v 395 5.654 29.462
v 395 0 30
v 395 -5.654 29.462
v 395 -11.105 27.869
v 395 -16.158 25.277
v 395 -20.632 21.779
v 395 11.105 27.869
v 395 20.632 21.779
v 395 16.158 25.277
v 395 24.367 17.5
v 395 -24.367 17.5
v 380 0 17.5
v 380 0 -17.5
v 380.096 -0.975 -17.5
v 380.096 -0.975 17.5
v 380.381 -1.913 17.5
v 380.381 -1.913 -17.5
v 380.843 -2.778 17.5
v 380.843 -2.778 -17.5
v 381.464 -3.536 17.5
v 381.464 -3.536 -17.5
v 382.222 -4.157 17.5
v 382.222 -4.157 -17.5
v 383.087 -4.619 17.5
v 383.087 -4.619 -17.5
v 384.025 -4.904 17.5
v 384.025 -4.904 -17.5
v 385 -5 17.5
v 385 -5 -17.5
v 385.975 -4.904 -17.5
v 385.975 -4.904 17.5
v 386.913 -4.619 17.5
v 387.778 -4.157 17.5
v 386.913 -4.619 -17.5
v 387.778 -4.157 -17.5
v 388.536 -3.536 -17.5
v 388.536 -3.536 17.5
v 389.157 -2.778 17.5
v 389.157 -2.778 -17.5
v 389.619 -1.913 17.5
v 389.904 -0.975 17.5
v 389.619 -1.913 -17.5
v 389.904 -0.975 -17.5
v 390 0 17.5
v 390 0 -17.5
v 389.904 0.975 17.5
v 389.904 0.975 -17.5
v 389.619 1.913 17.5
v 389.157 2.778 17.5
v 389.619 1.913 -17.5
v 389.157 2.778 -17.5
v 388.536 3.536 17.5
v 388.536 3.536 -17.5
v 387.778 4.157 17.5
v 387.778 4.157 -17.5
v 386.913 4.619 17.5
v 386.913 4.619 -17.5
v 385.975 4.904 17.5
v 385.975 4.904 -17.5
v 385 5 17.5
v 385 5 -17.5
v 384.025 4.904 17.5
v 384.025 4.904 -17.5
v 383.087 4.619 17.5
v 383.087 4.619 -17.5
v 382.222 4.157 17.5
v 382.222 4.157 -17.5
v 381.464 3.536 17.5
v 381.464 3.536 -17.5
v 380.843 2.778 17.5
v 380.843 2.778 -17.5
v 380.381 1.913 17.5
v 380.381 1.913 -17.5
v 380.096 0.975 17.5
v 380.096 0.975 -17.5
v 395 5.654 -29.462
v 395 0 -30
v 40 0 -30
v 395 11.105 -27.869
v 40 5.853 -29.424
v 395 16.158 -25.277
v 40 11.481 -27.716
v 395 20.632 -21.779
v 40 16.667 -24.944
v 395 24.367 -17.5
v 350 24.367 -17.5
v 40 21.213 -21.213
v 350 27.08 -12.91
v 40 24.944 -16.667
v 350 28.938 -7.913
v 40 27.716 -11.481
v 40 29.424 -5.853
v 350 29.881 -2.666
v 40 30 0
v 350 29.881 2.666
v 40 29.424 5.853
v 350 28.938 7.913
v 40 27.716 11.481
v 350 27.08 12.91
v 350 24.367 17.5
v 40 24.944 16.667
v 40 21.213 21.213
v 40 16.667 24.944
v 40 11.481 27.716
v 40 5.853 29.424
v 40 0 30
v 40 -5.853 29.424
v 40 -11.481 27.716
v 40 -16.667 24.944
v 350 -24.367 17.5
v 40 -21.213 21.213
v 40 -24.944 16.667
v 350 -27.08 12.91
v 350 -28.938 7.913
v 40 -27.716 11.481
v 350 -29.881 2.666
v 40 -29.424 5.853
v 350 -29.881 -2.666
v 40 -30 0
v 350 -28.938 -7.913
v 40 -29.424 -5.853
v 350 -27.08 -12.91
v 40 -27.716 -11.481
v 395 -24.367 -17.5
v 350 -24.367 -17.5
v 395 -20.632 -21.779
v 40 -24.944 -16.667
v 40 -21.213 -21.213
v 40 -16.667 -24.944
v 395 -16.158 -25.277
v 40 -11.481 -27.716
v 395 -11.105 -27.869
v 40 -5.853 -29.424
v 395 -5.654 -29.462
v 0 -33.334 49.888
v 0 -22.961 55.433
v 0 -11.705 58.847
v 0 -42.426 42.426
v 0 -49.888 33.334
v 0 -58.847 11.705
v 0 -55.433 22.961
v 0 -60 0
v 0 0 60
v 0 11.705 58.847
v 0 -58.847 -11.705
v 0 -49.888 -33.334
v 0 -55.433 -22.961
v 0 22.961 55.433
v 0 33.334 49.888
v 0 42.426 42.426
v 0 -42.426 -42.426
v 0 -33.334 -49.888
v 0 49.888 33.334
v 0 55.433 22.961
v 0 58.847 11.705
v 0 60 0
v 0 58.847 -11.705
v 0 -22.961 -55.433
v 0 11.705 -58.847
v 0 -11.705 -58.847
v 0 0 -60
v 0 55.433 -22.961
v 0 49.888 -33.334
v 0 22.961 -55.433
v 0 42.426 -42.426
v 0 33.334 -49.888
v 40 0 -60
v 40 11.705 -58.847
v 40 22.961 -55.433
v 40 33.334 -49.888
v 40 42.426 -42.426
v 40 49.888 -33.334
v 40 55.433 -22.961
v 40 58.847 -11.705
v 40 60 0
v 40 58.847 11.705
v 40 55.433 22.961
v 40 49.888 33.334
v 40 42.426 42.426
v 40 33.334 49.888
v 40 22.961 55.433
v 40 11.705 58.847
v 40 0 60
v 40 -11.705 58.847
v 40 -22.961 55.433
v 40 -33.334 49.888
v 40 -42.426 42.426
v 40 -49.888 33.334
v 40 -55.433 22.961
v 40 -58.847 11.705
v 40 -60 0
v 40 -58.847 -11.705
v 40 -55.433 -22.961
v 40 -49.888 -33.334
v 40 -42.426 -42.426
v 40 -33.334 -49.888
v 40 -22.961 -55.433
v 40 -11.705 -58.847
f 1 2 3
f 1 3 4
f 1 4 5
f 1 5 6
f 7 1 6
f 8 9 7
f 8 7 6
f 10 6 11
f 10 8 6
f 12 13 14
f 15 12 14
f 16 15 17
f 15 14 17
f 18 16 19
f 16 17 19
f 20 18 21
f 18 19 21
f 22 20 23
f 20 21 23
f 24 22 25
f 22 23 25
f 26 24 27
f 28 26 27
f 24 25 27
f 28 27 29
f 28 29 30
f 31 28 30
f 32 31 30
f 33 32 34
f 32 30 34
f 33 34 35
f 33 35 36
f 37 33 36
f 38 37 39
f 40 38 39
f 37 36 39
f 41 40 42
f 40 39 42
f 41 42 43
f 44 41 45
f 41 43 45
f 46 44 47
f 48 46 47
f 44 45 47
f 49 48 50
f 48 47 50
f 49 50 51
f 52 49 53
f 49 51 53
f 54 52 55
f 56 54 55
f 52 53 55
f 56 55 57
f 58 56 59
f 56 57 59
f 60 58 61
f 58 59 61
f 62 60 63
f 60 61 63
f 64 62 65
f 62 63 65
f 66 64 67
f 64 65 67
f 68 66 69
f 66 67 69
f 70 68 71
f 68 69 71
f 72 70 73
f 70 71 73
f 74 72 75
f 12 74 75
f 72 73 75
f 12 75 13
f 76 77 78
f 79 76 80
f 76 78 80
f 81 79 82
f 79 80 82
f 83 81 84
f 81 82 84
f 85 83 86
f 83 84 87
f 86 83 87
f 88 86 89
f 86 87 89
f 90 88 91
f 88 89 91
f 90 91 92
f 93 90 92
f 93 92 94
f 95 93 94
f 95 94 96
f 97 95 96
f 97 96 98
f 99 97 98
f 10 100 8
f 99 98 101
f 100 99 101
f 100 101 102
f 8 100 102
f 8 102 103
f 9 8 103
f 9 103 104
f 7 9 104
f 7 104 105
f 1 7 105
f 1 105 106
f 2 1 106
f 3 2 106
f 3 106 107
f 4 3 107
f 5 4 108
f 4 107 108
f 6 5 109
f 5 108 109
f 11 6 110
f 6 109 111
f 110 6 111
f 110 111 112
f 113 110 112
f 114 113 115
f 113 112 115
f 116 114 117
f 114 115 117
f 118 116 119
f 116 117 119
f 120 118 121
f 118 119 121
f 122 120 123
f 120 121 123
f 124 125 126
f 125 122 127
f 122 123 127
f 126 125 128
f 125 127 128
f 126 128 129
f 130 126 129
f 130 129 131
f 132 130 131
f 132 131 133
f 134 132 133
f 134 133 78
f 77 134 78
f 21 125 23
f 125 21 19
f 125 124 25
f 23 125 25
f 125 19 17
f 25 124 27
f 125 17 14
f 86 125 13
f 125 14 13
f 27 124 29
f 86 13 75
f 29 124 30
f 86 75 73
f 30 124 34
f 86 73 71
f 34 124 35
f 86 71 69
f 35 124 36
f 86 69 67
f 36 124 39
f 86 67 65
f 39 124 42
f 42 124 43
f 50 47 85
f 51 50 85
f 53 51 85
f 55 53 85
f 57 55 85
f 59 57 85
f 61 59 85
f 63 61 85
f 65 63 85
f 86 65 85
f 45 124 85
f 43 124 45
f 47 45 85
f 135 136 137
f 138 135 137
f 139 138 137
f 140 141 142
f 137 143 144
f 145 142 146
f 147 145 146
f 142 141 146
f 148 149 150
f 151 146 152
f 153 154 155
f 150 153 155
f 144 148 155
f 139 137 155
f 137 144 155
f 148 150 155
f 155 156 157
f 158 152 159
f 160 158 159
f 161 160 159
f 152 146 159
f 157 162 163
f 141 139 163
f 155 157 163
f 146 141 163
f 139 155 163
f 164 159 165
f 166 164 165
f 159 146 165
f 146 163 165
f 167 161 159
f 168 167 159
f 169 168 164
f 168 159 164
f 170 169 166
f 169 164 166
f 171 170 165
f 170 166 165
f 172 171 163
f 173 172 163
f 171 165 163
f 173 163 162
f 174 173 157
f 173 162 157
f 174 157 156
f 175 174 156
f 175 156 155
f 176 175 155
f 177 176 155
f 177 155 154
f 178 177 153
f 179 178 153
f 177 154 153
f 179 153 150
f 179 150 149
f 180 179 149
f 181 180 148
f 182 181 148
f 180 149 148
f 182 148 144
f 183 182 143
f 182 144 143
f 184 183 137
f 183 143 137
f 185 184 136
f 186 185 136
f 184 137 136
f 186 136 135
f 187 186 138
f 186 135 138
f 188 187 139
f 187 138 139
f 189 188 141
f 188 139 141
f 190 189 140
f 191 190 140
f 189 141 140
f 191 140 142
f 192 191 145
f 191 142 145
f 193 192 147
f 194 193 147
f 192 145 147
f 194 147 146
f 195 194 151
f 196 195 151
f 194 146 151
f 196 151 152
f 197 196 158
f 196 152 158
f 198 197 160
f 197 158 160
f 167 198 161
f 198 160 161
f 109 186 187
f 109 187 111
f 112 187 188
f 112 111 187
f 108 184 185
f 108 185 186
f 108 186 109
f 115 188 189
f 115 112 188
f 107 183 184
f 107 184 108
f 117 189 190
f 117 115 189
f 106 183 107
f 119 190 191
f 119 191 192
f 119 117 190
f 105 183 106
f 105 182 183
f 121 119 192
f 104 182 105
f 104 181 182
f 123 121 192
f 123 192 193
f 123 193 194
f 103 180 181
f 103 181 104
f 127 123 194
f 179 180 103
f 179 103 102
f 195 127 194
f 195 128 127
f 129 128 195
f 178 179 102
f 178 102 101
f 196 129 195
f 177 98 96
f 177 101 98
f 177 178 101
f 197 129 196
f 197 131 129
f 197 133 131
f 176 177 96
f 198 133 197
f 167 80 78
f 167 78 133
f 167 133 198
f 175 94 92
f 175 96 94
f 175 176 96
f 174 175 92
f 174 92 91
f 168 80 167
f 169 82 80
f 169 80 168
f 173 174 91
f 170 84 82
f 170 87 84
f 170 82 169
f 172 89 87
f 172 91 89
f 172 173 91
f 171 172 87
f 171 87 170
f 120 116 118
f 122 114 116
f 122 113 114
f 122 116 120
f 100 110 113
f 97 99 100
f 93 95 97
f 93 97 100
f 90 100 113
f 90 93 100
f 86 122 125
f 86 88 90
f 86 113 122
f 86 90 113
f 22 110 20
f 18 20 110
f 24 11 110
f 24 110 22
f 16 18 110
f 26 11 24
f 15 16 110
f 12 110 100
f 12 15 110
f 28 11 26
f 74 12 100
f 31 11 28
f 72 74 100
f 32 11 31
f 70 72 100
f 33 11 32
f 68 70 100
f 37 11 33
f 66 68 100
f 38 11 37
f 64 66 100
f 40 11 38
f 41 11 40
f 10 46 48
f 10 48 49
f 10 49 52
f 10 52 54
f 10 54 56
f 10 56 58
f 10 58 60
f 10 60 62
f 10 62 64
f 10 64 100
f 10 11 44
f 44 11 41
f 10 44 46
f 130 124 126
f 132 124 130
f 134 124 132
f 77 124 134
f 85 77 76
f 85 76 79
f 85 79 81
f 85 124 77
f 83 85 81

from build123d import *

# Parameters (mm, degrees)
SKETCH1_R           = 60
BOSS_EXTRUDE1_DEPTH = 40
SKETCH2_R           = 30
BOSS_EXTRUDE2_DEPTH = 355
SKETCH3_W           = 35
SKETCH3_H           = 68.96676223
CUT_EXTRUDE1_DEPTH  = 45
SKETCH4_R           = 5
BOSS_EXTRUDE3_DEPTH = 35


with BuildPart() as part:
    # Sketch1 → Boss-Extrude1 (new body)
    with BuildSketch(Plane(origin=(0, 0, 0), x_dir=(0, 0, -1), z_dir=(1, 0, 0))):
        Circle(SKETCH1_R)
    extrude(amount=BOSS_EXTRUDE1_DEPTH)

    # Sketch2 → Boss-Extrude2 (add)
    with BuildSketch(Plane(origin=(40, 0, 0), x_dir=(0, 0, -1), z_dir=(1, 0, 0))):
        Circle(SKETCH2_R)
    extrude(amount=BOSS_EXTRUDE2_DEPTH)

    # Sketch3 → Cut-Extrude1 (cut)
    with BuildSketch(Plane(origin=(395, 0, 0), x_dir=(0, 0, -1), z_dir=(1, 0, 0))):
        Rectangle(SKETCH3_W, SKETCH3_H)
    extrude(amount=-CUT_EXTRUDE1_DEPTH, mode=Mode.SUBTRACT)

    # Sketch4 → Boss-Extrude3 (add)
    with BuildSketch(Plane.XY.offset(-17.5)):
        with Locations(Location((385, 0, 0), (0, 0, 180))):
            Circle(SKETCH4_R)
    extrude(amount=BOSS_EXTRUDE3_DEPTH)


solid = part.part
